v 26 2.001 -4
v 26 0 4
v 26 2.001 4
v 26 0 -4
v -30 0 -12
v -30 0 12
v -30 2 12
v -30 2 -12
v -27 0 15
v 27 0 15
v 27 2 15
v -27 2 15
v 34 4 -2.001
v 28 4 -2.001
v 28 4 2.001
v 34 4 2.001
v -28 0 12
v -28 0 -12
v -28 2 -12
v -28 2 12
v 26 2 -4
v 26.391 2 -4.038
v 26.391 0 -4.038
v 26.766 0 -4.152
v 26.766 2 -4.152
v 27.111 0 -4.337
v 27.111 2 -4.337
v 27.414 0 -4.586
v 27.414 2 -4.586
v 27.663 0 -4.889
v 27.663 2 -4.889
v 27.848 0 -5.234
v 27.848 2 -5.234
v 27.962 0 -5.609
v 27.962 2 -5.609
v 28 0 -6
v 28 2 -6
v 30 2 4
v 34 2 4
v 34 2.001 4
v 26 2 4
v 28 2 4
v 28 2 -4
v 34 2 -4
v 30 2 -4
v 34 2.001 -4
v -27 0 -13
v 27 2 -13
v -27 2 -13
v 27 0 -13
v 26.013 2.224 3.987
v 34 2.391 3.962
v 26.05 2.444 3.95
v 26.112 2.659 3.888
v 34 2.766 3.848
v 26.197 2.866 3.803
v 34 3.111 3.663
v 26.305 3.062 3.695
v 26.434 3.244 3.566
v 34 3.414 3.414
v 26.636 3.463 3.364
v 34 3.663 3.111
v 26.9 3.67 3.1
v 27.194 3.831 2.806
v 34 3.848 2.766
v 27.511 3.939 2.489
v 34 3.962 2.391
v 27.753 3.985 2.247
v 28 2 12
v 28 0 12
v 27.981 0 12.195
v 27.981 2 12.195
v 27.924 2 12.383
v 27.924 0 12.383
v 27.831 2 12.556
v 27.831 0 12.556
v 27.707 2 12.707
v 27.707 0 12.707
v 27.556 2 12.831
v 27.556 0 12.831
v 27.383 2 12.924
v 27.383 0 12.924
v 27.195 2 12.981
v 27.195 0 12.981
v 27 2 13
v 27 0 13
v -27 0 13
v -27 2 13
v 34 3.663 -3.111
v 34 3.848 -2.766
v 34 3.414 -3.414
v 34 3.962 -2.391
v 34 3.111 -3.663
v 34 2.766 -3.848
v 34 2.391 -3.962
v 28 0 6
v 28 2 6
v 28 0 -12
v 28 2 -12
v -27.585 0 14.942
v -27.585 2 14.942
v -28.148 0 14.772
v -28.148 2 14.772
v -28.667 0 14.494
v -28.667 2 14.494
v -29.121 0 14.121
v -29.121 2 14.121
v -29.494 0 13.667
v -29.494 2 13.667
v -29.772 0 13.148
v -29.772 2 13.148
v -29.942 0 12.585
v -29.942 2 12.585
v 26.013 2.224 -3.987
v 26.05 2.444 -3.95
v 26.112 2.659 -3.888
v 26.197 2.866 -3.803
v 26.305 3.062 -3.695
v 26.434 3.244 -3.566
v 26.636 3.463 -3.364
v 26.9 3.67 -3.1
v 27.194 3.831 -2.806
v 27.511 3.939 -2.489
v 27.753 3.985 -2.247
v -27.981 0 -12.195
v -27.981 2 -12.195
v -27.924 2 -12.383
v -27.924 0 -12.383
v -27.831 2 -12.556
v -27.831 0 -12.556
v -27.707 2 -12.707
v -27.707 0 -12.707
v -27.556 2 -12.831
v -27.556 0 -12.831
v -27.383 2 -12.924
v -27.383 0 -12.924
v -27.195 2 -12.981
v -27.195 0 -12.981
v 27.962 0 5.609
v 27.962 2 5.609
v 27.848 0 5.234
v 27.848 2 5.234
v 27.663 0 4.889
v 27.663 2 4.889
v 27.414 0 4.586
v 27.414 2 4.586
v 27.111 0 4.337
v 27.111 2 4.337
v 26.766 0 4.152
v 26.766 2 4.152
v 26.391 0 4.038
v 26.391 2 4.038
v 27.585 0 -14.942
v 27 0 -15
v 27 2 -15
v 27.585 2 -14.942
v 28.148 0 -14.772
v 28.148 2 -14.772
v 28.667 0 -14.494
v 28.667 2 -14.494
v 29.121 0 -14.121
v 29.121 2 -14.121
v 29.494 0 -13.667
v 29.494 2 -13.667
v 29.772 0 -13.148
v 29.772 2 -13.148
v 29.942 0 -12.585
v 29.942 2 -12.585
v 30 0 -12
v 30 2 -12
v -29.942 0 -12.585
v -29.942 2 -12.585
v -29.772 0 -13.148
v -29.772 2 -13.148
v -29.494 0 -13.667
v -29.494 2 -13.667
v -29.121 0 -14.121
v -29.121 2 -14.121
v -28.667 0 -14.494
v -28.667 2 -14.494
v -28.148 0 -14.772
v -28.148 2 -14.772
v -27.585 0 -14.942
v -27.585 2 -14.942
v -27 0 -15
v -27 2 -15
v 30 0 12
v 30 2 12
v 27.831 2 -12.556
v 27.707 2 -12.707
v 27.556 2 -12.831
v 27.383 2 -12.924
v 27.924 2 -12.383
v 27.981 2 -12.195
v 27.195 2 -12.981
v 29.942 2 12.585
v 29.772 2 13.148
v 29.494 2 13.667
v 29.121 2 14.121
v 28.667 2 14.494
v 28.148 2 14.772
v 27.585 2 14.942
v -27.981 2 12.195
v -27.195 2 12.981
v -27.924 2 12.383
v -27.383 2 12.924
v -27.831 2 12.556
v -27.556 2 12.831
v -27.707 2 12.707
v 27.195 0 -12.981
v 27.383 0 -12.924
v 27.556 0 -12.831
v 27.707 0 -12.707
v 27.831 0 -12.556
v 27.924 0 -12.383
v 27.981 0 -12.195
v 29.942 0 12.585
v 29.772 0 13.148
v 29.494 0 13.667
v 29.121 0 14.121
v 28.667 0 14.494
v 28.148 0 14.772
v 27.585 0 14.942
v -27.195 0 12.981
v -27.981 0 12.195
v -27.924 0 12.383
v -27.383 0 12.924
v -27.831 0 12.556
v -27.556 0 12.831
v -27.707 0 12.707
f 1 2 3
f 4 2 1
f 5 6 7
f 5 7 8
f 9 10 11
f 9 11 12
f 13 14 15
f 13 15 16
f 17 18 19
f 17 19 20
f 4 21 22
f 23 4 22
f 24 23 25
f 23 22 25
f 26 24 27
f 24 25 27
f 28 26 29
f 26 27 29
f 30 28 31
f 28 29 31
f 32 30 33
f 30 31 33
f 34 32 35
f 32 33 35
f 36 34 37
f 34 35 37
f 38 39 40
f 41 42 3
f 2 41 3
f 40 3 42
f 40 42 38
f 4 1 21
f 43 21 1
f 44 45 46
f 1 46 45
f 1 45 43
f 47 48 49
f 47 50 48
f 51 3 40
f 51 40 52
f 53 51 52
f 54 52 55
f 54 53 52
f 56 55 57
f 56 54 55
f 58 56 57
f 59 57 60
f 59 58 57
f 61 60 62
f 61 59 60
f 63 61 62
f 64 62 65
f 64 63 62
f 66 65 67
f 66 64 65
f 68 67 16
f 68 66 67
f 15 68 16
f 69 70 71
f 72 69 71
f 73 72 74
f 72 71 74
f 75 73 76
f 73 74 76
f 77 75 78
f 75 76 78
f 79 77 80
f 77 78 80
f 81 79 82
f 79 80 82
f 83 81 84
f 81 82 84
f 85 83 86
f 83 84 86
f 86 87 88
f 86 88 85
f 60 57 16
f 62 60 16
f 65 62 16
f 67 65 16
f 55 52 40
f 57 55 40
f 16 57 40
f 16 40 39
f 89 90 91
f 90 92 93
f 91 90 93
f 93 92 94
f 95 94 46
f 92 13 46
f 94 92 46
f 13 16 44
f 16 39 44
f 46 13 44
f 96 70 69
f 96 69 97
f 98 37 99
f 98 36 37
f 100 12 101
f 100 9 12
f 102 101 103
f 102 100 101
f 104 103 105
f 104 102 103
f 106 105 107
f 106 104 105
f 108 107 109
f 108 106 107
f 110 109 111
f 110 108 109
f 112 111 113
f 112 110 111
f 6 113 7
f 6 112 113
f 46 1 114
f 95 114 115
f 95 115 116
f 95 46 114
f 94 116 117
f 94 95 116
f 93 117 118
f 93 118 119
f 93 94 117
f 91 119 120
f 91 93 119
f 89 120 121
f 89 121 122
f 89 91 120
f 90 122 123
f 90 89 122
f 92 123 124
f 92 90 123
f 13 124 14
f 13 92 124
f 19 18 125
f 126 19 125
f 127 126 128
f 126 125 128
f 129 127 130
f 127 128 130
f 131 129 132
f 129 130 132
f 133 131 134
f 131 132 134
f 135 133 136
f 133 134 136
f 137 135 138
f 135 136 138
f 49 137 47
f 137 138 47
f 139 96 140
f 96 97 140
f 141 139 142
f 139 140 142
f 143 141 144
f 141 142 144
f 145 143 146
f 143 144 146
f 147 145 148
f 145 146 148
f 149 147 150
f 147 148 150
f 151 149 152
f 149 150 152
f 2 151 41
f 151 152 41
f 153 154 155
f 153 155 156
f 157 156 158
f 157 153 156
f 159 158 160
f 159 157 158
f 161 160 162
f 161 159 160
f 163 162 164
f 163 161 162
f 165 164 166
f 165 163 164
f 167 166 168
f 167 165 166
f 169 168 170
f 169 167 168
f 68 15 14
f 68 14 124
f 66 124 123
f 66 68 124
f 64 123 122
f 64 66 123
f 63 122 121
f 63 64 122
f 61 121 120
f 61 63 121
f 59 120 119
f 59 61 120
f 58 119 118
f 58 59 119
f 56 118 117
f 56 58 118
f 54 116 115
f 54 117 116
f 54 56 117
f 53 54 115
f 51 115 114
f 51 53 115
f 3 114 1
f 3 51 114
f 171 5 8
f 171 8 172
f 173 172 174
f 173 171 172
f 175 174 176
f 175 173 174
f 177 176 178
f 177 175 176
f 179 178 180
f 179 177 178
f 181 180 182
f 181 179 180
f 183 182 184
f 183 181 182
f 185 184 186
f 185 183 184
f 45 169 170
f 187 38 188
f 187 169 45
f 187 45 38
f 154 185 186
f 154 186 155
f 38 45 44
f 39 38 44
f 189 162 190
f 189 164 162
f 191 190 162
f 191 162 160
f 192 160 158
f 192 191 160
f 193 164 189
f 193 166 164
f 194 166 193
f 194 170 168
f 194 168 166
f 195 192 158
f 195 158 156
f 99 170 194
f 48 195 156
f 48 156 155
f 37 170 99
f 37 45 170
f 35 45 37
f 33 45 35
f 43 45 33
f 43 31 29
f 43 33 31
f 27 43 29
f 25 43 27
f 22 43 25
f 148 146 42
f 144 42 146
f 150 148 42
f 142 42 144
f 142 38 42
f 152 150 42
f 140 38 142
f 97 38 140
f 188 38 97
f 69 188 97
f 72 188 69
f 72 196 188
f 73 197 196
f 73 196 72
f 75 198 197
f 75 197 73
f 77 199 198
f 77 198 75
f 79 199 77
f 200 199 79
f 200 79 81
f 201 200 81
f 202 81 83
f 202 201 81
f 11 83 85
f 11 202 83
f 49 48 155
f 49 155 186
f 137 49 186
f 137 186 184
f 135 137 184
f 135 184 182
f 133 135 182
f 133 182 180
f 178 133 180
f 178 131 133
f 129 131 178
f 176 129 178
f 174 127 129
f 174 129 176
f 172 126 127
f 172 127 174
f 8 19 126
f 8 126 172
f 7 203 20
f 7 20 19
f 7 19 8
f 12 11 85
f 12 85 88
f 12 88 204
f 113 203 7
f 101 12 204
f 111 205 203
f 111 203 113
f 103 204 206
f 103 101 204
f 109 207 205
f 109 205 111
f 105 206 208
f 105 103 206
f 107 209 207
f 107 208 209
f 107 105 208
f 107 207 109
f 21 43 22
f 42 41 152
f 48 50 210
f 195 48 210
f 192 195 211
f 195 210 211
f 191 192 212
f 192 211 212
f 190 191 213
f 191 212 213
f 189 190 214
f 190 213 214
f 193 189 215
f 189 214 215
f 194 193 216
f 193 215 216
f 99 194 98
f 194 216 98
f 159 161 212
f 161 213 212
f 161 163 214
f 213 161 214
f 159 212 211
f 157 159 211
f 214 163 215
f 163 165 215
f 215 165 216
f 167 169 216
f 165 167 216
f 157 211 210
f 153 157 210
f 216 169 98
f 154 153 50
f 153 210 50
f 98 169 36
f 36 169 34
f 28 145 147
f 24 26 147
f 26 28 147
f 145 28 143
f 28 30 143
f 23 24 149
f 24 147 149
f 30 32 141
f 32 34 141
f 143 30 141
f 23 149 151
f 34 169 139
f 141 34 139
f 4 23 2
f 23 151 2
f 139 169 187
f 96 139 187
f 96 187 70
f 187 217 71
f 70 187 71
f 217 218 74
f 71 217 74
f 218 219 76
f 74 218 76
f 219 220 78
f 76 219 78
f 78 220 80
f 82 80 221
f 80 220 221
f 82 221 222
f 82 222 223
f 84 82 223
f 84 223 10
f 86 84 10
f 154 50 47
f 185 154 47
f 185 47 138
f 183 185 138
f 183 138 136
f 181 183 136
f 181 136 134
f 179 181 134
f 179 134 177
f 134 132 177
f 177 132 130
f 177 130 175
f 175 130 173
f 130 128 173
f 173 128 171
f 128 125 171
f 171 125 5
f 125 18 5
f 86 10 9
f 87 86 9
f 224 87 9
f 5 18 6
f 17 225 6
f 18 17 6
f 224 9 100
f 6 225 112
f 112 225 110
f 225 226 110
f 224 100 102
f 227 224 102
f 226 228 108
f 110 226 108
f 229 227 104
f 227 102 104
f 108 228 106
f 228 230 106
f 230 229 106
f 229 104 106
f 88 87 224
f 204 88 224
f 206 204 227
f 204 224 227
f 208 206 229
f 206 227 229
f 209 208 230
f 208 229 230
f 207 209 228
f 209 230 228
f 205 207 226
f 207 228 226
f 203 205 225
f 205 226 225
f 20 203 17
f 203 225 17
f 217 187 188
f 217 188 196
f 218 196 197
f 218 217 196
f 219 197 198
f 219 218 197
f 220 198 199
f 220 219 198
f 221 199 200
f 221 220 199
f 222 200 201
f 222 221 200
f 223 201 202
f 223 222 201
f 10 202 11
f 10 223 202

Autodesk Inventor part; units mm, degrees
ref_plane "YZ Plane" through (0, 0, 0) normal (1, 0, 0) x (0, 1, 0)
ref_plane "XZ Plane" through (0, 0, 0) normal (0, 1, 0) x (-1, 0, 0)
ref_plane "XY Plane" through (0, 0, 0) normal (0, 0, 1) x (1, 0, 0)
sketch "Sketch1" plane through (0, 0, 0) normal (0, 1, 0) x (-1, 0, 0)
  line L0 (-27, 15) -> (27, 15)
  line L1 (30, 12) -> (30, -12)
  line L2 (27, -15) -> (-27, -15)
  line L3 (-30, -12) -> (-30, 12)
  line L4 (-30, 15) -> (30, -15) construction
  line L5 (30, 15) -> (-30, -15) construction
  arc A0 (30, 12) -> (27, 15) centre (27, 12) ccw
  arc A1 (27, -15) -> (30, -12) centre (27, -12) ccw
  arc A2 (-30, -12) -> (-27, -15) centre (-27, -12) ccw
  arc A3 (-27, 15) -> (-30, 12) centre (-27, 12) ccw
  line L6 (28, -12) -> (28, 12)
  arc A4 (28, 12) -> (27, 13) centre (27, 12) ccw
  line L7 (27, 13) -> (-27, 13)
  arc A5 (-27, 13) -> (-28, 12) centre (-27, 12) ccw
  line L8 (-28, 12) -> (-28, -12)
  arc A6 (-28, -12) -> (-27, -13) centre (-27, -12) ccw
  line L9 (-27, -13) -> (27, -13)
  arc A7 (27, -13) -> (28, -12) centre (27, -12) ccw
  line L10 (-26, -4) -> (-30, -4)
  line L11 (-30, -4) -> (-30, 4)
  line L12 (-30, 4) -> (-26, 4)
  line L13 (-26, 4) -> (-26, -4)
  line L14 (-26, -4) -> (-30, 4) construction
  line L15 (-30, -4) -> (-26, 4) construction
  point P0 (0, 0)
  point P1 (-28, 0)
  point P2 (-28, 4)
  point P3 (-28, -4)
  dimension "d0" = 30
  dimension "d1" = 60
  dimension "d2" = 3
  dimension "d3" = 3
  dimension "d4" = 2
  dimension "d7" = 8
extrude "Extrusion1" add sketch "Sketch1" along normal blind 2 contours L0 A0 L1 A1 L2 A2 L3 L10 L8 A6 L9 A7 L6 A4 L7 A5 L12 A3 | L12 L8 L10 L3 | L12 L13 L10 L8
sketch "Sketch2" plane through (0, 2, 0) normal (0, 1, 0) x (1, 0, 0)
  line L0 (26, -4) -> (28, -4) projected
  line L1 (34, 4) -> (26, 4)
  line L2 (26, 4) -> (26, -4)
  line L3 (26, -4) -> (34, -4)
  line L4 (34, -4) -> (34, 4)
  line L5 (30, -12) -> (30, 12) projected
  line L6 (34, 4) -> (26, -4) construction
  line L7 (26, 4) -> (34, -4) construction
  point P0 (0, 0)
  point P1 (30, 0)
extrude "Extrusion2" add sketch "Sketch2" along normal blind 2
fillet "Fillet1" radius 2 3 edges at (26, 4, 0) (30, 4, -4) (30, 4, 4)
fillet "Fillet2" radius 2 2 edges at (28, 1, -4) (28, 1, 4)
properties part number "SolarpanelAdapter_bot" material "ABS Plastic"
